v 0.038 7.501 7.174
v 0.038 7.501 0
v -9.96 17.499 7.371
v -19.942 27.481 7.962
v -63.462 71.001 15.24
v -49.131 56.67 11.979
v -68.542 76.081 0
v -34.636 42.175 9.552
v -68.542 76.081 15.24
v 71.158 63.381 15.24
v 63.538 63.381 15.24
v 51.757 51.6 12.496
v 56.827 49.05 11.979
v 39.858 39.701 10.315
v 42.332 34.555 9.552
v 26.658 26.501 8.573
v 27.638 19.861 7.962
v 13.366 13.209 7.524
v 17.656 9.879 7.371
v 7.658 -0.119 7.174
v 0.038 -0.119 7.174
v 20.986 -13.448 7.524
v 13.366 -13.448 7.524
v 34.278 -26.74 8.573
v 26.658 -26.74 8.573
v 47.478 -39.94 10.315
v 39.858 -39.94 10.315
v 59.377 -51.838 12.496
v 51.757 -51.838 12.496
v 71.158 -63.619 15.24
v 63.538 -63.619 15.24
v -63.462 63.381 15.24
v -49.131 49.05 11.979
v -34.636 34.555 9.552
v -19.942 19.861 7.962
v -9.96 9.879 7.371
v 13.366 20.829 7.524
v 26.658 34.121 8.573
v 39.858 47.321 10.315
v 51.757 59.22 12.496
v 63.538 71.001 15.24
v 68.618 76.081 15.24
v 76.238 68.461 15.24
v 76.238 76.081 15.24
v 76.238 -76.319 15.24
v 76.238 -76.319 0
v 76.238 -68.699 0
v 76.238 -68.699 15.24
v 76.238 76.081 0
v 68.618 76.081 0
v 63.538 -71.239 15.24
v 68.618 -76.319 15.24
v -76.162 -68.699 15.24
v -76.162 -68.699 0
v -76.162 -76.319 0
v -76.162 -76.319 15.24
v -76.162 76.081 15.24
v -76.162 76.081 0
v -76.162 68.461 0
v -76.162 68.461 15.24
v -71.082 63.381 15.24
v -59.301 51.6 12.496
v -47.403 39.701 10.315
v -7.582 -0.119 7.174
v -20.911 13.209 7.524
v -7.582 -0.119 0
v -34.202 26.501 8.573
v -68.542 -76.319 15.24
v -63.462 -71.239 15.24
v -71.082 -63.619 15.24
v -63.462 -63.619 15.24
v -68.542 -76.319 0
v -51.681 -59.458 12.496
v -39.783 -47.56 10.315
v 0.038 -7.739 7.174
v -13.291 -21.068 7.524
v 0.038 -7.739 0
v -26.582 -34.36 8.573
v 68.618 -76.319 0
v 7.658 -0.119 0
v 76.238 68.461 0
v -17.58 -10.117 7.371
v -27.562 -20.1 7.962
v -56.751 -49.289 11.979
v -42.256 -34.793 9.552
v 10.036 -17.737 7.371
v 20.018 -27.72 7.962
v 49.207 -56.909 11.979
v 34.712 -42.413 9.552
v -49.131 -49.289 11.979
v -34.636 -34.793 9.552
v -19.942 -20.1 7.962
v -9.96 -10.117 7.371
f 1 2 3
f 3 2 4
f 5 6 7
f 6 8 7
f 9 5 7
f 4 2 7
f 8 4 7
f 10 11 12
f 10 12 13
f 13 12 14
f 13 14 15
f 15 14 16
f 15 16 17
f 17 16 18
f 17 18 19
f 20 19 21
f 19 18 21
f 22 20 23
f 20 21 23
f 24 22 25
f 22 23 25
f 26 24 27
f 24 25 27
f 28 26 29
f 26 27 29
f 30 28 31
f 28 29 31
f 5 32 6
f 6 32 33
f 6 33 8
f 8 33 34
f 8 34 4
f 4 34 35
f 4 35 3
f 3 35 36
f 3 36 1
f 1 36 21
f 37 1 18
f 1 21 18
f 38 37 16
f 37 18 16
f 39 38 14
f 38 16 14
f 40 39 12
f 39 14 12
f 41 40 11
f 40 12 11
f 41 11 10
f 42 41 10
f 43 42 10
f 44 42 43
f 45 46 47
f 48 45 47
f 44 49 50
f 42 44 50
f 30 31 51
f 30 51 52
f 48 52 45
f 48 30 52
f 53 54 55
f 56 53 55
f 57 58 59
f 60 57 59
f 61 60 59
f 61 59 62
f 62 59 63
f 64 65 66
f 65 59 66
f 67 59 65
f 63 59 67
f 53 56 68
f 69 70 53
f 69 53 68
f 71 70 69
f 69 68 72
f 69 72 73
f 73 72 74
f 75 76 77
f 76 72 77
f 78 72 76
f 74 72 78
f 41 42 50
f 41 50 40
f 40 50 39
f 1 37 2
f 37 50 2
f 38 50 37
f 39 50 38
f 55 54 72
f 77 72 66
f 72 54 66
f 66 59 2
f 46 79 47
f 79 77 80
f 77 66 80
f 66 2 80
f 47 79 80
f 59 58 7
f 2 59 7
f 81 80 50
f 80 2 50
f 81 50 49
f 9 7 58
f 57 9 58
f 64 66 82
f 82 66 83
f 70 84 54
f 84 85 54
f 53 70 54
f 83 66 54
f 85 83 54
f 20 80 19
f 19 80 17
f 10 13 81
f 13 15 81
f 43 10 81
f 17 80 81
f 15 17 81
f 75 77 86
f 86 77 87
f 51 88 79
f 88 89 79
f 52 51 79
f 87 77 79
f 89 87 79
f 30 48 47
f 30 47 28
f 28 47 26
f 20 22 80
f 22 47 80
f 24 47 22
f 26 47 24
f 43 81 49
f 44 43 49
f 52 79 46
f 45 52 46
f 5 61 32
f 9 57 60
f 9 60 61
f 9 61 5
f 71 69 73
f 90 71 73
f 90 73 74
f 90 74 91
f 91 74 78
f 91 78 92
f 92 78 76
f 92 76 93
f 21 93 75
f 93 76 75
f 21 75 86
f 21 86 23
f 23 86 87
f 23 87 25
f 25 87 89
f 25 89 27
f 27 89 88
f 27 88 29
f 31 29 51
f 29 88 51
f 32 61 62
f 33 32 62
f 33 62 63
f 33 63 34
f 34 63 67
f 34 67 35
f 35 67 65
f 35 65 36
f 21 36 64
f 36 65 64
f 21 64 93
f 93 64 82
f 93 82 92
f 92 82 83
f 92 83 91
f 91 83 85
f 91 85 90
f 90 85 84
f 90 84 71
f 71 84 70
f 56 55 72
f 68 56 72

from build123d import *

# Parameters (mm, degrees)
F1_DEPTH = 15.24
F3_DEPTH = 152.401
F5_DEPTH = 152.401


with BuildPart() as f1:
    # F0 (on Top) → F1 (new body)
    with BuildSketch(Plane.XY):
        Polygon((-68.542148, 76.080675), (-76.162148, 76.080675), (-76.162148, 68.460675), (-7.582148, -0.119325), (-76.162148, -68.699325), (-76.162148, -76.319325), (-68.542148, -76.319325), (0.037852, -7.739325), (68.617852, -76.319325), (76.237852, -76.319325), (76.237852, -68.699325), (7.657852, -0.119325), (76.237852, 68.460675), (76.237852, 76.080675), (68.617852, 76.080675), (0.037852, 7.500675), align=None)
    extrude(amount=F1_DEPTH)

    # F2 (on face) → F3 (cut, through all)
    with BuildSketch(Plane.XZ.offset(76.319325)):
        with BuildLine():
            Line((63.537852, 15.24), (-63.462148, 15.24))
            ThreePointArc((-63.462148, 15.24), (0.037852, 7.174442), (63.537852, 15.24))
        make_face()
    extrude(amount=-F3_DEPTH, mode=Mode.SUBTRACT)

    # F4 (on face) → F5 (cut, through all)
    with BuildSketch(Plane(origin=(-76.162148, 0, 0), x_dir=(0, -1, 0), z_dir=(-1, 0, 0))):
        with BuildLine():
            Line((63.619325, 15.24), (-63.380675, 15.24))
            ThreePointArc((-63.380675, 15.24), (0.119325, 7.174442), (63.619325, 15.24))
        make_face()
    extrude(amount=-F5_DEPTH, mode=Mode.SUBTRACT)


solid = f1.part
